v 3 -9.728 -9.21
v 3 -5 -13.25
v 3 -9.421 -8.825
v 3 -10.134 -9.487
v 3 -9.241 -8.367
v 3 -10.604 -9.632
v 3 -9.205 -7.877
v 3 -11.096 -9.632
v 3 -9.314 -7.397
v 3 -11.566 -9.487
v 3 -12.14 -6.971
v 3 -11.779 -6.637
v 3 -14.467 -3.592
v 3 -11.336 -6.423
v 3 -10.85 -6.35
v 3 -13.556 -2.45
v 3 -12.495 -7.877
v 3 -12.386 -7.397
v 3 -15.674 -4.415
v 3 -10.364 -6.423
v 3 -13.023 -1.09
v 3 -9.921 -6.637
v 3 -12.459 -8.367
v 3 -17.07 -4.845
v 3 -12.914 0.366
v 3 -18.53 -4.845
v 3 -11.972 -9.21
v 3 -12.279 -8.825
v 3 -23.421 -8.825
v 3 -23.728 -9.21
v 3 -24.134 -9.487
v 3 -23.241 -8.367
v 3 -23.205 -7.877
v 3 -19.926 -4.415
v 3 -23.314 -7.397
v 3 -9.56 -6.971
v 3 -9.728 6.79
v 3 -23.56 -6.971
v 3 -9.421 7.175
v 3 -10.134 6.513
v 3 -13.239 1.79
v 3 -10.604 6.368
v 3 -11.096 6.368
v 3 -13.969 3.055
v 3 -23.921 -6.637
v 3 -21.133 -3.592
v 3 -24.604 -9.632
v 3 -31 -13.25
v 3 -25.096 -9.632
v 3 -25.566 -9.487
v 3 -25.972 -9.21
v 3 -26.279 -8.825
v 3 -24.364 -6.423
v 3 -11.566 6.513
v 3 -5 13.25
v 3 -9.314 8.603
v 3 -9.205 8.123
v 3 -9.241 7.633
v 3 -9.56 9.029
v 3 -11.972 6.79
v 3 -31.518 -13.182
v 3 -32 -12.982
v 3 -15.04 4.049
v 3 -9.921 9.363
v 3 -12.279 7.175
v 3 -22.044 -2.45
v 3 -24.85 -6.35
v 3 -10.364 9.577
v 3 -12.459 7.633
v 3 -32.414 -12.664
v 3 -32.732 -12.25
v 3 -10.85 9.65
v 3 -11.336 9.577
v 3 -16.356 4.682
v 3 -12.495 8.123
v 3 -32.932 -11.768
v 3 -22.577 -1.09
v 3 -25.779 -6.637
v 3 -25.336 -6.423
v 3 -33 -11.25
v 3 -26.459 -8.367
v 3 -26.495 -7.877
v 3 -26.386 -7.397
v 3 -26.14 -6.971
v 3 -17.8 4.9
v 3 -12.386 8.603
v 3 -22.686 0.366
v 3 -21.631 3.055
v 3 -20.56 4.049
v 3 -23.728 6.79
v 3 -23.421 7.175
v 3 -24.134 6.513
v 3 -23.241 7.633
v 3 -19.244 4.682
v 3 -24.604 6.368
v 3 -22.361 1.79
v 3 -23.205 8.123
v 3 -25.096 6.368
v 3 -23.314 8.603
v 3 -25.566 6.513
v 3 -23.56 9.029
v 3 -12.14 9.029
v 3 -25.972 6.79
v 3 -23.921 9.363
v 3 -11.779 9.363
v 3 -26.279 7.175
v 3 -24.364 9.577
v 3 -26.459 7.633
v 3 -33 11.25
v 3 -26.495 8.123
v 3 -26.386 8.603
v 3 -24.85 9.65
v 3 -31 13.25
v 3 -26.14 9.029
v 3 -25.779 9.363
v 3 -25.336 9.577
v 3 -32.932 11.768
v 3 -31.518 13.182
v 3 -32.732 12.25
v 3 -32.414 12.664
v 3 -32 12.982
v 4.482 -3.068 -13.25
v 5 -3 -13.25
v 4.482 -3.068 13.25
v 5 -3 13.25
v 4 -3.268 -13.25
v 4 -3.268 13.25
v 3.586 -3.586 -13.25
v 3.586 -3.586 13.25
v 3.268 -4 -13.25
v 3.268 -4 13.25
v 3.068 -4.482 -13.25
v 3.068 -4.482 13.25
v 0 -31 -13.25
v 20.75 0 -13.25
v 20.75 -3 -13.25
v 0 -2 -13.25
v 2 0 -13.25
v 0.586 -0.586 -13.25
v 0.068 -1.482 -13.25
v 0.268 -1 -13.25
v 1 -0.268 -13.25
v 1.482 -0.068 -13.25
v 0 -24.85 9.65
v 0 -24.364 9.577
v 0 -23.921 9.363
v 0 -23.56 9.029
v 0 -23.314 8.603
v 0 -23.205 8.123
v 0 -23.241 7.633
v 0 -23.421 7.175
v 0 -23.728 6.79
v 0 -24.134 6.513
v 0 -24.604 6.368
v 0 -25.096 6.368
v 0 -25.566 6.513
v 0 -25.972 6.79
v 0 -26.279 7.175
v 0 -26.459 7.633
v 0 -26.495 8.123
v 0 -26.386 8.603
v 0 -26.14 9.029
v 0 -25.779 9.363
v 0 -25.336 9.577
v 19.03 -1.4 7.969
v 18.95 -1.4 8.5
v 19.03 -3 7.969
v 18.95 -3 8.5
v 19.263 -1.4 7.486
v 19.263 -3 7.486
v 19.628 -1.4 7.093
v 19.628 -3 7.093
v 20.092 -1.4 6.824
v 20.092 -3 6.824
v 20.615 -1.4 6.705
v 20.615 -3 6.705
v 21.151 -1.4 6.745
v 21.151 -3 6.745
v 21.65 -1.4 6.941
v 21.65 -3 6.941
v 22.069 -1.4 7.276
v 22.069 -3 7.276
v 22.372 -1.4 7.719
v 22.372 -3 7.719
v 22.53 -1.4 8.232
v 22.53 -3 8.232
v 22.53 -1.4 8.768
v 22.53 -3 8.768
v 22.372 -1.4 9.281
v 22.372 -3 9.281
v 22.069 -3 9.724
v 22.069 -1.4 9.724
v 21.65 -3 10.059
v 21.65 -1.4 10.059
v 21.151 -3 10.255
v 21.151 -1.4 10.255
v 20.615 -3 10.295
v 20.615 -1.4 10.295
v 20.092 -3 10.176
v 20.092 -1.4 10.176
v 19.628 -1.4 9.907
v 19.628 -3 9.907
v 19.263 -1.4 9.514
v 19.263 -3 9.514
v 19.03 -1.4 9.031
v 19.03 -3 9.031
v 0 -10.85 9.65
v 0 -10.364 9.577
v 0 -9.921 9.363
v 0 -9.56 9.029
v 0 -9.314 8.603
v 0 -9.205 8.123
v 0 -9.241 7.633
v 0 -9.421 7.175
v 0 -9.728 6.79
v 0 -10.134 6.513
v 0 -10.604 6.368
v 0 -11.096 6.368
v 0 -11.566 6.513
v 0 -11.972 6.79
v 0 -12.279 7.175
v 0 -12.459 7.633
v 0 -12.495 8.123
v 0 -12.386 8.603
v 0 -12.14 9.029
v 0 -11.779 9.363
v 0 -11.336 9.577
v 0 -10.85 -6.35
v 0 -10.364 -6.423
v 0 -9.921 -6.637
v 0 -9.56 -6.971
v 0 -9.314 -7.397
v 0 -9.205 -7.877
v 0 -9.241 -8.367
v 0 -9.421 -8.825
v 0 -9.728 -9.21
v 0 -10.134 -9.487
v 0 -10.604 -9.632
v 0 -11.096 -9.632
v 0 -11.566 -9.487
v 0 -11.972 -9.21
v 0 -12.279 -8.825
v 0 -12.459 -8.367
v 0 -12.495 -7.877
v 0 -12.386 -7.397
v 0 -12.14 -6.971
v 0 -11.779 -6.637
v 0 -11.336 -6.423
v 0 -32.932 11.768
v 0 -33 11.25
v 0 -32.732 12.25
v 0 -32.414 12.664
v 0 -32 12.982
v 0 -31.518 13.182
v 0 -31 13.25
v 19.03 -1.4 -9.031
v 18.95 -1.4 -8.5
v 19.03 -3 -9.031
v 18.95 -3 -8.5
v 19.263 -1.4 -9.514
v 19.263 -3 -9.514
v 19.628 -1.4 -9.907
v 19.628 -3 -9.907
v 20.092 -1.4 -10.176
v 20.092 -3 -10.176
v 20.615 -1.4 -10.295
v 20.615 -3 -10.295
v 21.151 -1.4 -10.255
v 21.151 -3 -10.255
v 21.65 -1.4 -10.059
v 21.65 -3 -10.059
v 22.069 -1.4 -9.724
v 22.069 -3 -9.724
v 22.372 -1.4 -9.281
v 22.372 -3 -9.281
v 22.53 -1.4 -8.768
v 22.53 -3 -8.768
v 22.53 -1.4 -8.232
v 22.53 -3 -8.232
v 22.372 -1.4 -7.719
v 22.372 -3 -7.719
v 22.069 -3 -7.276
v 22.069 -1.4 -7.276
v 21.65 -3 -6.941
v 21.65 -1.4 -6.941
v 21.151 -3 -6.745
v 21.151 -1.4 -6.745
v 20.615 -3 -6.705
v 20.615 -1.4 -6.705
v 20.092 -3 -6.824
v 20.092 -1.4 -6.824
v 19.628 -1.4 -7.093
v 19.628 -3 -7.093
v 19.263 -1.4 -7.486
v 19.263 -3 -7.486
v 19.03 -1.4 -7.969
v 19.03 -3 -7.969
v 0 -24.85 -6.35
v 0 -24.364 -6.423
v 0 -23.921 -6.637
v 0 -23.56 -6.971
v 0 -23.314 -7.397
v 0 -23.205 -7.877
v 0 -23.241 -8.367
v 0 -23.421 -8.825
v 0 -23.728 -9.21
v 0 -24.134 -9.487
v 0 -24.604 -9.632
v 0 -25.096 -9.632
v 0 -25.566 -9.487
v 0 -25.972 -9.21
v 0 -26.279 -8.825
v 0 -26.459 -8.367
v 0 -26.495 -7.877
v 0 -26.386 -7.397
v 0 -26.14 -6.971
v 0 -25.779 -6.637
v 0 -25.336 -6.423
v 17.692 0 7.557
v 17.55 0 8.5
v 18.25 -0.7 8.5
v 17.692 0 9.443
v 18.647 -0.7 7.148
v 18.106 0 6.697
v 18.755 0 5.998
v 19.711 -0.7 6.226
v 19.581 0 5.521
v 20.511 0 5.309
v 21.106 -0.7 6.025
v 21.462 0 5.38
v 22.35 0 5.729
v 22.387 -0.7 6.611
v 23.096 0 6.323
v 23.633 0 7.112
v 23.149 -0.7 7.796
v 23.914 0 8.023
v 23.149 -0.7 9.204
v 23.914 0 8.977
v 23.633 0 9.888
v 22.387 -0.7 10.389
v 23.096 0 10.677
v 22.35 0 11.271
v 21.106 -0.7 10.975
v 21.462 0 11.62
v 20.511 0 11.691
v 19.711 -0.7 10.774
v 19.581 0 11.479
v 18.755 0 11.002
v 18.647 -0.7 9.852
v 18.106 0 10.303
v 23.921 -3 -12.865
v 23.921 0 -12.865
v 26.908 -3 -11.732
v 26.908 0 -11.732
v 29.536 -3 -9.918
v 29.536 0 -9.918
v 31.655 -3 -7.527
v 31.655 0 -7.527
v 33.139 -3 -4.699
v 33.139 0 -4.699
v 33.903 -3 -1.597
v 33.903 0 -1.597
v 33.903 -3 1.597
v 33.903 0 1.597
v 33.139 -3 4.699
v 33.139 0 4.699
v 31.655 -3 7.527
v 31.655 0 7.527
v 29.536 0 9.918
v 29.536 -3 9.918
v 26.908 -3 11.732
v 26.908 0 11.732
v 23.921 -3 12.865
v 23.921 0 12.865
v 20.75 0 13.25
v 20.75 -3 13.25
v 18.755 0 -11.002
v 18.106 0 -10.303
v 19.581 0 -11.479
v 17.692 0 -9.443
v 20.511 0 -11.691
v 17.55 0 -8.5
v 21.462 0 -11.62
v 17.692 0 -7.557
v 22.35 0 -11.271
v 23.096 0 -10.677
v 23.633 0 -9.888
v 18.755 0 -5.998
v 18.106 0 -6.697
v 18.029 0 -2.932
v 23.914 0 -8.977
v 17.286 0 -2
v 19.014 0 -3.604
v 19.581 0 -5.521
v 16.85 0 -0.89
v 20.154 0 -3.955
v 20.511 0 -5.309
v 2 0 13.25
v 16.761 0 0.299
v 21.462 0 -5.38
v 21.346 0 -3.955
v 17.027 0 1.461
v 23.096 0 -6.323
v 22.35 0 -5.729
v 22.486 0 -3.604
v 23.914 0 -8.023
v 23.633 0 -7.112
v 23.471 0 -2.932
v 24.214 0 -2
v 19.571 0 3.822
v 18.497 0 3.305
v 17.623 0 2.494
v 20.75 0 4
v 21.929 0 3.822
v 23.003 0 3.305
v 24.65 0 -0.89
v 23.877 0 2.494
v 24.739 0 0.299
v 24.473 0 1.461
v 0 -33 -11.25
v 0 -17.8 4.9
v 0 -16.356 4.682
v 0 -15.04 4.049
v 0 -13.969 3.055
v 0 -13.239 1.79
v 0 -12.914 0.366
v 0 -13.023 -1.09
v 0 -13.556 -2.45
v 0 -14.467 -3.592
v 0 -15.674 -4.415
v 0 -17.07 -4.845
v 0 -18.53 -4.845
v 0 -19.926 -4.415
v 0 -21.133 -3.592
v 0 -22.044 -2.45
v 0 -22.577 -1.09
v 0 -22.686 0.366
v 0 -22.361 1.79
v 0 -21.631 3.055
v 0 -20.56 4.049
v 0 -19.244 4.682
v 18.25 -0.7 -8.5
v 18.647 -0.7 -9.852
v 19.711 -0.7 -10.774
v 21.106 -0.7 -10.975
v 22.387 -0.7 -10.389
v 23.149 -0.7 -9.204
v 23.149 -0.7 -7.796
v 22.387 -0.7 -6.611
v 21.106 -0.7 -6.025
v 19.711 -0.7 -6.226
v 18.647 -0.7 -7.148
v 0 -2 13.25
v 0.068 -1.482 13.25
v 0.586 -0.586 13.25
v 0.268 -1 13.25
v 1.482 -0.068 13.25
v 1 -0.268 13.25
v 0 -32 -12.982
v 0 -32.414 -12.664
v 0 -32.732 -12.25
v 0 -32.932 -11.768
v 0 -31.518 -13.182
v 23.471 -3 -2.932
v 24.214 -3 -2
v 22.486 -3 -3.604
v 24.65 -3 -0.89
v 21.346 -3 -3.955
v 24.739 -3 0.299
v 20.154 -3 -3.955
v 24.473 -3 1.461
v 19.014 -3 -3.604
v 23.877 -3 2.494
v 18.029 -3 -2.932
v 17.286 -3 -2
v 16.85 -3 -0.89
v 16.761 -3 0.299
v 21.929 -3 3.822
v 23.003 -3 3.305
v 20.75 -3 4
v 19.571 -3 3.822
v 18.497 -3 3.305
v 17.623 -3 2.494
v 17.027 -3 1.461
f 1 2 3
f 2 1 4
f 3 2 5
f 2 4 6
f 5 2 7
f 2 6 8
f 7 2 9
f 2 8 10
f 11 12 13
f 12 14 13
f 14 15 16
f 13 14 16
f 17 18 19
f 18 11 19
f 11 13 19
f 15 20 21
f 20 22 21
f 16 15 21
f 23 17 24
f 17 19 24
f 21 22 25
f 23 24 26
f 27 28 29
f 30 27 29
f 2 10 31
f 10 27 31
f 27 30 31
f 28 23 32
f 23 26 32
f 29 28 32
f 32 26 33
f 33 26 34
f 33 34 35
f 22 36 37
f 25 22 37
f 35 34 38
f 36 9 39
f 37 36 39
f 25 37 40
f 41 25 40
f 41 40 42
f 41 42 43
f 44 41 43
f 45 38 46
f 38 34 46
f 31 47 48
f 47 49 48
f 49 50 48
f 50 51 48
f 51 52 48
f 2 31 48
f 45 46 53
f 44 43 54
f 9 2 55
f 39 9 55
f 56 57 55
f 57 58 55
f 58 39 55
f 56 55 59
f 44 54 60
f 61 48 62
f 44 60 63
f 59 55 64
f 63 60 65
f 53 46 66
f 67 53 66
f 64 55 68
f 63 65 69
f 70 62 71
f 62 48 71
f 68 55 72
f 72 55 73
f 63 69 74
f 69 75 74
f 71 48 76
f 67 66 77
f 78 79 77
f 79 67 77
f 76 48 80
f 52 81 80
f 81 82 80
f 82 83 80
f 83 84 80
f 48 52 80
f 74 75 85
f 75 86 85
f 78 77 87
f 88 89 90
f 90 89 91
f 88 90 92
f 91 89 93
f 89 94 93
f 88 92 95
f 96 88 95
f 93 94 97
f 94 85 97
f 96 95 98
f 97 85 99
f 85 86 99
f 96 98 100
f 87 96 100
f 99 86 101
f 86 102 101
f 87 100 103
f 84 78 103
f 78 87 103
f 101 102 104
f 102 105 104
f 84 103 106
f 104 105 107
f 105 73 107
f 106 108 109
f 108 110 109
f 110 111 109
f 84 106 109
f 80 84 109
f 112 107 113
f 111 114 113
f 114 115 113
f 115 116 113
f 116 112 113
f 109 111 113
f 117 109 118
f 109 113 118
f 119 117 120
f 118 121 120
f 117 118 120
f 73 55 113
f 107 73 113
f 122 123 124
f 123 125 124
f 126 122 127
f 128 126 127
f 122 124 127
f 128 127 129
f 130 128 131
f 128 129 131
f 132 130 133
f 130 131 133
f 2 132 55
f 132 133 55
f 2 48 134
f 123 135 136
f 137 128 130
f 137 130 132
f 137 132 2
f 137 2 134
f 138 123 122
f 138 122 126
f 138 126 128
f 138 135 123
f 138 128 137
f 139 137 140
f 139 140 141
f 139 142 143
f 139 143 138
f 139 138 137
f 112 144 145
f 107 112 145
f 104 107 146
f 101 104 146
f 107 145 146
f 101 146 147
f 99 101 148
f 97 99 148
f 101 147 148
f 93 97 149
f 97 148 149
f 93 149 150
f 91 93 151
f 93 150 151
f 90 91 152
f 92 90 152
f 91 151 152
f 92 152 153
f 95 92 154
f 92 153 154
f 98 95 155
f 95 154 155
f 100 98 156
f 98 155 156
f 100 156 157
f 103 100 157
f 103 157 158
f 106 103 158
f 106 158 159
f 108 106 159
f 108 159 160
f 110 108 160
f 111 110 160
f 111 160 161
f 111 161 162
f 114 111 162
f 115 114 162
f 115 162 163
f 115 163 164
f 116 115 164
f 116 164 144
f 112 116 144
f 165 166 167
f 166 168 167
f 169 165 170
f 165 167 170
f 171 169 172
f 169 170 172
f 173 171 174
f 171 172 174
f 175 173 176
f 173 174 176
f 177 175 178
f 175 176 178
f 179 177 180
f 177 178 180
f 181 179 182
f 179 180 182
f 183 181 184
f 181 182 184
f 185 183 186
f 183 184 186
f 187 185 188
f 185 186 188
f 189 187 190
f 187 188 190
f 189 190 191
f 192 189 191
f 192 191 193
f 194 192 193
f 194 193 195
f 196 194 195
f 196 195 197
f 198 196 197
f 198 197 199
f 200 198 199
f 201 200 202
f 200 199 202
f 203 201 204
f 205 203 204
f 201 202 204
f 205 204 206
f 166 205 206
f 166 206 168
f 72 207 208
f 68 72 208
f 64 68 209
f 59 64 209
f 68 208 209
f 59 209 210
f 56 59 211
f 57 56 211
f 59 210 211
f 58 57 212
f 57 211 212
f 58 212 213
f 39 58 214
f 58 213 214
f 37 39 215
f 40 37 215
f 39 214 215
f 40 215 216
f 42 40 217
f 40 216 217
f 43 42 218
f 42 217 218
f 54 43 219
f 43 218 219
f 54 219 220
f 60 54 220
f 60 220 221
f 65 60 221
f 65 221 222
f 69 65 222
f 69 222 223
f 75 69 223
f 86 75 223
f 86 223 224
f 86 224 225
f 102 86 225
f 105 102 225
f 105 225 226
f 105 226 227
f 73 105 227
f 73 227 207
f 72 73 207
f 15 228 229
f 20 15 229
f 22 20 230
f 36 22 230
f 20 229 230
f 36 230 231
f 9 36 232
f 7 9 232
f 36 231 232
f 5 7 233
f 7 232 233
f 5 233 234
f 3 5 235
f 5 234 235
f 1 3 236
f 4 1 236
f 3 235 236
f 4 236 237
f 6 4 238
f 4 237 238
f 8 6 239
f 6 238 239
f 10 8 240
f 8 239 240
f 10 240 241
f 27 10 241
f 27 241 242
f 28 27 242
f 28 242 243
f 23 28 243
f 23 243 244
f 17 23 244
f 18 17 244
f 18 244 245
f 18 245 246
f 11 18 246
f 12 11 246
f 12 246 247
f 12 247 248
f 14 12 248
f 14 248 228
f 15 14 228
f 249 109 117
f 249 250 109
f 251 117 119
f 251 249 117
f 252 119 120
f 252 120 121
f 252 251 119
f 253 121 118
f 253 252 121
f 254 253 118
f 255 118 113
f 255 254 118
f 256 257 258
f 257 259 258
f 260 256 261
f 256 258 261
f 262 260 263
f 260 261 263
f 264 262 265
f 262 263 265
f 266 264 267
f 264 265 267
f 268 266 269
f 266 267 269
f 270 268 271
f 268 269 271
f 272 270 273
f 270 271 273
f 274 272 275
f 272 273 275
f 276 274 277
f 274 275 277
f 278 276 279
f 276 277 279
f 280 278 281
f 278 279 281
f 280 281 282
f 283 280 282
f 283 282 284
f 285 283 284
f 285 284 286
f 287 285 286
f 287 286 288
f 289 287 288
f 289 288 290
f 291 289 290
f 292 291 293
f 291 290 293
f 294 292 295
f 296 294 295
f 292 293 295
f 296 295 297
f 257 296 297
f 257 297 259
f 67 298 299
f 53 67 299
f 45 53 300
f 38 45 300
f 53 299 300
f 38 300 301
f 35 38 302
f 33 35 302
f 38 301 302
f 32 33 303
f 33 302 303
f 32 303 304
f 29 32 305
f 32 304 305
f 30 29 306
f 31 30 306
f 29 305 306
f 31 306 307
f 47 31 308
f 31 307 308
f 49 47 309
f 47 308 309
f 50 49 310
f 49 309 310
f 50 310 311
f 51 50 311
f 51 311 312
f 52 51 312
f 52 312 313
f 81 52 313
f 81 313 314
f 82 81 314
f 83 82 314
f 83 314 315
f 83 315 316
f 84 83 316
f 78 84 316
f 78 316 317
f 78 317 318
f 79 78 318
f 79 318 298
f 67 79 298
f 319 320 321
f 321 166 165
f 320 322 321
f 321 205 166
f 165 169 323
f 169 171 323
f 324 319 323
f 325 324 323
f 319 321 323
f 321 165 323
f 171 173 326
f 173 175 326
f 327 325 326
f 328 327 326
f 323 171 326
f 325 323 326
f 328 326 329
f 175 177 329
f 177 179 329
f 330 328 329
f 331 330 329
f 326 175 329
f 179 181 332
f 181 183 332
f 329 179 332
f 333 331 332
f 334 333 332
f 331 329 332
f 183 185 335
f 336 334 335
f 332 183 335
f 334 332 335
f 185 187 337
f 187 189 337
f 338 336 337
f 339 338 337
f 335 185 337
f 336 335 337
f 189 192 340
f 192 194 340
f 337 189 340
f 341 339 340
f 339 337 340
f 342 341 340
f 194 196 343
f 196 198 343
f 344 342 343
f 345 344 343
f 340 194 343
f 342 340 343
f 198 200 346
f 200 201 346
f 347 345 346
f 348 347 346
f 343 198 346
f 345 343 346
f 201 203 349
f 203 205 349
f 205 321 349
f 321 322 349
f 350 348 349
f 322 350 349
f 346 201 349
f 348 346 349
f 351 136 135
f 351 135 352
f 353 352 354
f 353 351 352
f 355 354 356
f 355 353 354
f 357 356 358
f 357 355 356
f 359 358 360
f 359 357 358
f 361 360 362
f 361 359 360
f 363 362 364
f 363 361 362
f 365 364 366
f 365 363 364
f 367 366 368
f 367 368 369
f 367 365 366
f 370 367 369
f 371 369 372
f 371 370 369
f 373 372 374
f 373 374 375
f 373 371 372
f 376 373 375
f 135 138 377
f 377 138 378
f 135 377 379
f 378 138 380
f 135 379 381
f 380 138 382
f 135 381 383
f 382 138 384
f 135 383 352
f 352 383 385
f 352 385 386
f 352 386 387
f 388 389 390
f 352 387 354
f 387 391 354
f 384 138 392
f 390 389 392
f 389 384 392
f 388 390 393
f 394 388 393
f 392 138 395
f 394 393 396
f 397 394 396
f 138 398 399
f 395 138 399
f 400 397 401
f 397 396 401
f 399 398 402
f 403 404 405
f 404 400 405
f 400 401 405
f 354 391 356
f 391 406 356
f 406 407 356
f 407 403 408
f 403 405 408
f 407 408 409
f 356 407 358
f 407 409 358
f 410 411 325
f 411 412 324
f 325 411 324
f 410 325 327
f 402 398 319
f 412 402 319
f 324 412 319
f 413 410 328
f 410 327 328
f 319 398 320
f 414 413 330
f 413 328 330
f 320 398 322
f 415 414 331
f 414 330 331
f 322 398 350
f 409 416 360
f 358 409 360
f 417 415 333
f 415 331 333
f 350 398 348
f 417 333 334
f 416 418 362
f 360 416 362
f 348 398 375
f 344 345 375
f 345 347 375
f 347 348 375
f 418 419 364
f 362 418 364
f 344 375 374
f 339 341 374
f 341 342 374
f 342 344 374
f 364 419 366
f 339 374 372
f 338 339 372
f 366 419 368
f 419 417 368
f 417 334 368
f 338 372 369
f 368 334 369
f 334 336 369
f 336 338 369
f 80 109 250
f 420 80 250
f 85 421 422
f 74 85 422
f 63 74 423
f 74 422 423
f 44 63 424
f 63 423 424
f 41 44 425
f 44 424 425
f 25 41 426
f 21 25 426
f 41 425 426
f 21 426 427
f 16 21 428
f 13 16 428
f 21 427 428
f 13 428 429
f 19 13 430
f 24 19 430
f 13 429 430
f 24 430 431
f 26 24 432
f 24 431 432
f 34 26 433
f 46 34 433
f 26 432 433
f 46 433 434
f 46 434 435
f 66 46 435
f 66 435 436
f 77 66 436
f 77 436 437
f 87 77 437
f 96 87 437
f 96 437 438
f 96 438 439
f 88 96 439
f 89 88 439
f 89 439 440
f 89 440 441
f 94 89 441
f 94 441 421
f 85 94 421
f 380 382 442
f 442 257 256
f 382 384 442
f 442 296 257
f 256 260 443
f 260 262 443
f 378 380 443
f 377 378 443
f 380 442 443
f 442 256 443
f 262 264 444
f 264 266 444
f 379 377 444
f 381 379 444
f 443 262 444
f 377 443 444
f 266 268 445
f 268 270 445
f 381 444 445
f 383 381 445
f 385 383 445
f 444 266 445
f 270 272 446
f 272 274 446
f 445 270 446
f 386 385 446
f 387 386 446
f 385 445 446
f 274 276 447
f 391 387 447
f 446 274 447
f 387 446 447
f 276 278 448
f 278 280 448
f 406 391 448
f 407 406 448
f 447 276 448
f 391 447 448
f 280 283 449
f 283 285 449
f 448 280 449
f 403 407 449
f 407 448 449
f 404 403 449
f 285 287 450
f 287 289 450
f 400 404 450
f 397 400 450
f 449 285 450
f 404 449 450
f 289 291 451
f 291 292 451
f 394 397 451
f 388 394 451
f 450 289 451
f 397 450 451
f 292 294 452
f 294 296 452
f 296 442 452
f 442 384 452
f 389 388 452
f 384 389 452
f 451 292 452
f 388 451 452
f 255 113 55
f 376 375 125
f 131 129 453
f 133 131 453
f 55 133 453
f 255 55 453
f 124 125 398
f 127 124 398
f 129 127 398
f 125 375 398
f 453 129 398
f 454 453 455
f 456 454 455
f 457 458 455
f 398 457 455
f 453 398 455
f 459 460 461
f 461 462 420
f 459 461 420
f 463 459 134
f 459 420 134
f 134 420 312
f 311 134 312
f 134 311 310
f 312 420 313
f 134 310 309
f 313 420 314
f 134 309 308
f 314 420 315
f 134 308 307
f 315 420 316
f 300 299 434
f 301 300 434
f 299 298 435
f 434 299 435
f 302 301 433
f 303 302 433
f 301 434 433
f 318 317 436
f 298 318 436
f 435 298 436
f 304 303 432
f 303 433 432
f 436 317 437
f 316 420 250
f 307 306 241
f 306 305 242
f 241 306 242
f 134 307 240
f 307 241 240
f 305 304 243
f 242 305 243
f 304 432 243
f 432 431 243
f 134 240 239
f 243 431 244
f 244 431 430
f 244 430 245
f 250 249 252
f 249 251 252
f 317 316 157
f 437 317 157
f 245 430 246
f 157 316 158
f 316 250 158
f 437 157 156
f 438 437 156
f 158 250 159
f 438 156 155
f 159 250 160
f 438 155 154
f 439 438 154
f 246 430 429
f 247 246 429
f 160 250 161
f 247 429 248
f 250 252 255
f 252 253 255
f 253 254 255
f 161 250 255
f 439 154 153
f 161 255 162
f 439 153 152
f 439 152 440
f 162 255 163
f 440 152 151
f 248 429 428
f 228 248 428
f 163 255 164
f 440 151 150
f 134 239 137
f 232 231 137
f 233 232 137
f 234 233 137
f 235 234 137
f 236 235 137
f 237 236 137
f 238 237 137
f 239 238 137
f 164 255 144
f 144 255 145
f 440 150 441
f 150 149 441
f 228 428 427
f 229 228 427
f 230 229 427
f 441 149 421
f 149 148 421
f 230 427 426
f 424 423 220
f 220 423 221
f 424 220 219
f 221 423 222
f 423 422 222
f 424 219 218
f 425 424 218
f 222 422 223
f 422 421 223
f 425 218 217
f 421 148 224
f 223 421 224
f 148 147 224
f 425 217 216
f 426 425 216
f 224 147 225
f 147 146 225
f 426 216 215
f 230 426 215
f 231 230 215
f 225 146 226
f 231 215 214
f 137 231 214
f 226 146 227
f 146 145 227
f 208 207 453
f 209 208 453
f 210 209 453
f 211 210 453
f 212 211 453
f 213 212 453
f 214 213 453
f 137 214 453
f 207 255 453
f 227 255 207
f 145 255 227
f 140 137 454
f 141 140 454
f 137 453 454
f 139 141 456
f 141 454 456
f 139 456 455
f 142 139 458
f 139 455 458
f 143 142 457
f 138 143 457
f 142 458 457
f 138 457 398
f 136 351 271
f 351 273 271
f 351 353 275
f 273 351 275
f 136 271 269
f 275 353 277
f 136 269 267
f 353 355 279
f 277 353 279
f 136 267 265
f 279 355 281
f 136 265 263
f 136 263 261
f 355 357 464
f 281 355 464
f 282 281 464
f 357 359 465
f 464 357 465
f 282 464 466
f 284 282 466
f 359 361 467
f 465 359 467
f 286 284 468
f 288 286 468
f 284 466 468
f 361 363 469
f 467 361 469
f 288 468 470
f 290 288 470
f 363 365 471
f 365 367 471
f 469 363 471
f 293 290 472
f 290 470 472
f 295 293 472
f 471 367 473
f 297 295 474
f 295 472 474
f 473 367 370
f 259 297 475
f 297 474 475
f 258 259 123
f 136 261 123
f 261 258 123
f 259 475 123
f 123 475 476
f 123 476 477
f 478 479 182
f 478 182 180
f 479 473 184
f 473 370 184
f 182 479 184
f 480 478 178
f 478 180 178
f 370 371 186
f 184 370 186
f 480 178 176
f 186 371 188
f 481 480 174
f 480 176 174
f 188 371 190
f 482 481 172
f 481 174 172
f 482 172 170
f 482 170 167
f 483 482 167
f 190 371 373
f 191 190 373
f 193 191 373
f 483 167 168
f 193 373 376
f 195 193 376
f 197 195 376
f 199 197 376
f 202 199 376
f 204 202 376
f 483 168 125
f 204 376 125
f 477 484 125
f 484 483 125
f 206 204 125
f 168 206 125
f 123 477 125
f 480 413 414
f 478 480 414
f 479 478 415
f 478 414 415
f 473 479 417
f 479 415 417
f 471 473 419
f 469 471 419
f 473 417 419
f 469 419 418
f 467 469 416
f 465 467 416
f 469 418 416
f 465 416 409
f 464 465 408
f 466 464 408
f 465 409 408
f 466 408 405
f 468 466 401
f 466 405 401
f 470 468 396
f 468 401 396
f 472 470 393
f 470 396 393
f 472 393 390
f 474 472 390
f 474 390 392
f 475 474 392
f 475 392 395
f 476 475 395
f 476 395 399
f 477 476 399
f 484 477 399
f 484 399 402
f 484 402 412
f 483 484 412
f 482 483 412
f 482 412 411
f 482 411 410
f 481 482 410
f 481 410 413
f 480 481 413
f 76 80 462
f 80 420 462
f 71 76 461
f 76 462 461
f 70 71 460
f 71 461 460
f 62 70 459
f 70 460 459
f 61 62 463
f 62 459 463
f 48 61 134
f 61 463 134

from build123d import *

# Parameters (mm, degrees)
EXTRUDE_1_DEPTH           = 13.25
CUT_EXTRUDE_2_DEPTH       = 40
SKETCH_5_R                = 1.65
SKETCH_5_R_2              = 4.9
CUT_EXTRUDE_4_DEPTH       = 40
FILLET_1_R                = 2
SKETCH_7_R                = 4
CUT_EXTRUDE_5_DEPTH       = 10
HOLE_WIZARD_1_D           = 3.6
HOLE_WIZARD_1_DEPTH       = 8
HOLE_WIZARD_1_CSINK_D     = 6.4
HOLE_WIZARD_1_CSINK_ANGLE = 90
HOLE_WIZARD_1_TIP         = 1.081549114
HOLE_WIZARD_2_D           = 3.6
HOLE_WIZARD_2_DEPTH       = 8
HOLE_WIZARD_2_CSINK_D     = 6.4
HOLE_WIZARD_2_CSINK_ANGLE = 90
HOLE_WIZARD_2_TIP         = 1.081549114


with BuildPart() as part:
    # 草图1 → 凸台-拉伸1 (new, symmetric)
    with BuildSketch(Plane.XY):
        with BuildLine():
            Line((0, -33), (0, -2))
            ThreePointArc((0, -2), (0.585786438, -0.585786438), (2, 0))
            Line((2, 0), (50, 0))
            Line((50, 0), (50, -3))
            Line((50, -3), (5, -3))
            ThreePointArc((5, -3), (3.585786438, -3.585786438), (3, -5))
            Line((3, -5), (3, -33))
            Line((3, -33), (0, -33))
        make_face()
    extrude(amount=EXTRUDE_1_DEPTH, both=True)

    # 草图3 → 切除-拉伸2 (cut)
    with BuildSketch(Plane.XZ.offset(3)):
        with BuildLine():
            Line((20.75, 13.25), (50, 13.25))
            Line((50, 13.25), (50, -13.25))
            Line((50, -13.25), (20.75, -13.25))
            ThreePointArc((20.75, -13.25), (34, 0), (20.75, 13.25))
        make_face()
    extrude(amount=-CUT_EXTRUDE_2_DEPTH, mode=Mode.SUBTRACT)

    # 草图5 → 切除-拉伸4 (cut)
    with BuildSketch(Plane.ZY):
        with Locations((8, -10.85)):
            Circle(SKETCH_5_R)
        with Locations((8, -24.85)):
            Circle(SKETCH_5_R)
        with Locations((-8, -24.85)):
            Circle(SKETCH_5_R)
        with Locations((-8, -10.85)):
            Circle(SKETCH_5_R)
        with Locations((0, -17.8)):
            Circle(SKETCH_5_R_2)
    extrude(amount=-CUT_EXTRUDE_4_DEPTH, mode=Mode.SUBTRACT)

    # 圆角1
    fillet_1_edges = [part.edges().sort_by_distance(p)[0] for p in [
        (1.5, -33, 13.25),
        (1.5, -33, -13.25),
    ]]
    fillet(fillet_1_edges, radius=FILLET_1_R)

    # 草图7 → 切除-拉伸5 (cut)
    with BuildSketch(Plane(origin=(0, 0, 0), x_dir=(1, 0, 0), z_dir=(0, 1, 0))):
        with Locations(Location((20.75, 0, 0), (0, 0, 270))):
            Circle(SKETCH_7_R)
    extrude(amount=-CUT_EXTRUDE_5_DEPTH, mode=Mode.SUBTRACT)

    # 打孔尺寸开槽半沉头螺钉的类型1
    with Locations(Plane(origin=(0, 0, 0), x_dir=(1, 0, 0), z_dir=(0, 1, 0))):
        with Locations((20.75, -8.5)):
            CounterSinkHole(HOLE_WIZARD_1_D / 2, HOLE_WIZARD_1_CSINK_D / 2, depth=HOLE_WIZARD_1_DEPTH, counter_sink_angle=HOLE_WIZARD_1_CSINK_ANGLE)
            with Locations((0, 0, -(HOLE_WIZARD_1_DEPTH + HOLE_WIZARD_1_TIP / 2))):  # 118° drill point
                Cone(0, HOLE_WIZARD_1_D / 2, HOLE_WIZARD_1_TIP, mode=Mode.SUBTRACT)

    # 打孔尺寸开槽半沉头螺钉的类型2
    with Locations(Plane(origin=(0, 0, 0), x_dir=(1, 0, 0), z_dir=(0, 1, 0))):
        with Locations((20.75, 8.5)):
            CounterSinkHole(HOLE_WIZARD_2_D / 2, HOLE_WIZARD_2_CSINK_D / 2, depth=HOLE_WIZARD_2_DEPTH, counter_sink_angle=HOLE_WIZARD_2_CSINK_ANGLE)
            with Locations((0, 0, -(HOLE_WIZARD_2_DEPTH + HOLE_WIZARD_2_TIP / 2))):  # 118° drill point
                Cone(0, HOLE_WIZARD_2_D / 2, HOLE_WIZARD_2_TIP, mode=Mode.SUBTRACT)


solid = part.part
